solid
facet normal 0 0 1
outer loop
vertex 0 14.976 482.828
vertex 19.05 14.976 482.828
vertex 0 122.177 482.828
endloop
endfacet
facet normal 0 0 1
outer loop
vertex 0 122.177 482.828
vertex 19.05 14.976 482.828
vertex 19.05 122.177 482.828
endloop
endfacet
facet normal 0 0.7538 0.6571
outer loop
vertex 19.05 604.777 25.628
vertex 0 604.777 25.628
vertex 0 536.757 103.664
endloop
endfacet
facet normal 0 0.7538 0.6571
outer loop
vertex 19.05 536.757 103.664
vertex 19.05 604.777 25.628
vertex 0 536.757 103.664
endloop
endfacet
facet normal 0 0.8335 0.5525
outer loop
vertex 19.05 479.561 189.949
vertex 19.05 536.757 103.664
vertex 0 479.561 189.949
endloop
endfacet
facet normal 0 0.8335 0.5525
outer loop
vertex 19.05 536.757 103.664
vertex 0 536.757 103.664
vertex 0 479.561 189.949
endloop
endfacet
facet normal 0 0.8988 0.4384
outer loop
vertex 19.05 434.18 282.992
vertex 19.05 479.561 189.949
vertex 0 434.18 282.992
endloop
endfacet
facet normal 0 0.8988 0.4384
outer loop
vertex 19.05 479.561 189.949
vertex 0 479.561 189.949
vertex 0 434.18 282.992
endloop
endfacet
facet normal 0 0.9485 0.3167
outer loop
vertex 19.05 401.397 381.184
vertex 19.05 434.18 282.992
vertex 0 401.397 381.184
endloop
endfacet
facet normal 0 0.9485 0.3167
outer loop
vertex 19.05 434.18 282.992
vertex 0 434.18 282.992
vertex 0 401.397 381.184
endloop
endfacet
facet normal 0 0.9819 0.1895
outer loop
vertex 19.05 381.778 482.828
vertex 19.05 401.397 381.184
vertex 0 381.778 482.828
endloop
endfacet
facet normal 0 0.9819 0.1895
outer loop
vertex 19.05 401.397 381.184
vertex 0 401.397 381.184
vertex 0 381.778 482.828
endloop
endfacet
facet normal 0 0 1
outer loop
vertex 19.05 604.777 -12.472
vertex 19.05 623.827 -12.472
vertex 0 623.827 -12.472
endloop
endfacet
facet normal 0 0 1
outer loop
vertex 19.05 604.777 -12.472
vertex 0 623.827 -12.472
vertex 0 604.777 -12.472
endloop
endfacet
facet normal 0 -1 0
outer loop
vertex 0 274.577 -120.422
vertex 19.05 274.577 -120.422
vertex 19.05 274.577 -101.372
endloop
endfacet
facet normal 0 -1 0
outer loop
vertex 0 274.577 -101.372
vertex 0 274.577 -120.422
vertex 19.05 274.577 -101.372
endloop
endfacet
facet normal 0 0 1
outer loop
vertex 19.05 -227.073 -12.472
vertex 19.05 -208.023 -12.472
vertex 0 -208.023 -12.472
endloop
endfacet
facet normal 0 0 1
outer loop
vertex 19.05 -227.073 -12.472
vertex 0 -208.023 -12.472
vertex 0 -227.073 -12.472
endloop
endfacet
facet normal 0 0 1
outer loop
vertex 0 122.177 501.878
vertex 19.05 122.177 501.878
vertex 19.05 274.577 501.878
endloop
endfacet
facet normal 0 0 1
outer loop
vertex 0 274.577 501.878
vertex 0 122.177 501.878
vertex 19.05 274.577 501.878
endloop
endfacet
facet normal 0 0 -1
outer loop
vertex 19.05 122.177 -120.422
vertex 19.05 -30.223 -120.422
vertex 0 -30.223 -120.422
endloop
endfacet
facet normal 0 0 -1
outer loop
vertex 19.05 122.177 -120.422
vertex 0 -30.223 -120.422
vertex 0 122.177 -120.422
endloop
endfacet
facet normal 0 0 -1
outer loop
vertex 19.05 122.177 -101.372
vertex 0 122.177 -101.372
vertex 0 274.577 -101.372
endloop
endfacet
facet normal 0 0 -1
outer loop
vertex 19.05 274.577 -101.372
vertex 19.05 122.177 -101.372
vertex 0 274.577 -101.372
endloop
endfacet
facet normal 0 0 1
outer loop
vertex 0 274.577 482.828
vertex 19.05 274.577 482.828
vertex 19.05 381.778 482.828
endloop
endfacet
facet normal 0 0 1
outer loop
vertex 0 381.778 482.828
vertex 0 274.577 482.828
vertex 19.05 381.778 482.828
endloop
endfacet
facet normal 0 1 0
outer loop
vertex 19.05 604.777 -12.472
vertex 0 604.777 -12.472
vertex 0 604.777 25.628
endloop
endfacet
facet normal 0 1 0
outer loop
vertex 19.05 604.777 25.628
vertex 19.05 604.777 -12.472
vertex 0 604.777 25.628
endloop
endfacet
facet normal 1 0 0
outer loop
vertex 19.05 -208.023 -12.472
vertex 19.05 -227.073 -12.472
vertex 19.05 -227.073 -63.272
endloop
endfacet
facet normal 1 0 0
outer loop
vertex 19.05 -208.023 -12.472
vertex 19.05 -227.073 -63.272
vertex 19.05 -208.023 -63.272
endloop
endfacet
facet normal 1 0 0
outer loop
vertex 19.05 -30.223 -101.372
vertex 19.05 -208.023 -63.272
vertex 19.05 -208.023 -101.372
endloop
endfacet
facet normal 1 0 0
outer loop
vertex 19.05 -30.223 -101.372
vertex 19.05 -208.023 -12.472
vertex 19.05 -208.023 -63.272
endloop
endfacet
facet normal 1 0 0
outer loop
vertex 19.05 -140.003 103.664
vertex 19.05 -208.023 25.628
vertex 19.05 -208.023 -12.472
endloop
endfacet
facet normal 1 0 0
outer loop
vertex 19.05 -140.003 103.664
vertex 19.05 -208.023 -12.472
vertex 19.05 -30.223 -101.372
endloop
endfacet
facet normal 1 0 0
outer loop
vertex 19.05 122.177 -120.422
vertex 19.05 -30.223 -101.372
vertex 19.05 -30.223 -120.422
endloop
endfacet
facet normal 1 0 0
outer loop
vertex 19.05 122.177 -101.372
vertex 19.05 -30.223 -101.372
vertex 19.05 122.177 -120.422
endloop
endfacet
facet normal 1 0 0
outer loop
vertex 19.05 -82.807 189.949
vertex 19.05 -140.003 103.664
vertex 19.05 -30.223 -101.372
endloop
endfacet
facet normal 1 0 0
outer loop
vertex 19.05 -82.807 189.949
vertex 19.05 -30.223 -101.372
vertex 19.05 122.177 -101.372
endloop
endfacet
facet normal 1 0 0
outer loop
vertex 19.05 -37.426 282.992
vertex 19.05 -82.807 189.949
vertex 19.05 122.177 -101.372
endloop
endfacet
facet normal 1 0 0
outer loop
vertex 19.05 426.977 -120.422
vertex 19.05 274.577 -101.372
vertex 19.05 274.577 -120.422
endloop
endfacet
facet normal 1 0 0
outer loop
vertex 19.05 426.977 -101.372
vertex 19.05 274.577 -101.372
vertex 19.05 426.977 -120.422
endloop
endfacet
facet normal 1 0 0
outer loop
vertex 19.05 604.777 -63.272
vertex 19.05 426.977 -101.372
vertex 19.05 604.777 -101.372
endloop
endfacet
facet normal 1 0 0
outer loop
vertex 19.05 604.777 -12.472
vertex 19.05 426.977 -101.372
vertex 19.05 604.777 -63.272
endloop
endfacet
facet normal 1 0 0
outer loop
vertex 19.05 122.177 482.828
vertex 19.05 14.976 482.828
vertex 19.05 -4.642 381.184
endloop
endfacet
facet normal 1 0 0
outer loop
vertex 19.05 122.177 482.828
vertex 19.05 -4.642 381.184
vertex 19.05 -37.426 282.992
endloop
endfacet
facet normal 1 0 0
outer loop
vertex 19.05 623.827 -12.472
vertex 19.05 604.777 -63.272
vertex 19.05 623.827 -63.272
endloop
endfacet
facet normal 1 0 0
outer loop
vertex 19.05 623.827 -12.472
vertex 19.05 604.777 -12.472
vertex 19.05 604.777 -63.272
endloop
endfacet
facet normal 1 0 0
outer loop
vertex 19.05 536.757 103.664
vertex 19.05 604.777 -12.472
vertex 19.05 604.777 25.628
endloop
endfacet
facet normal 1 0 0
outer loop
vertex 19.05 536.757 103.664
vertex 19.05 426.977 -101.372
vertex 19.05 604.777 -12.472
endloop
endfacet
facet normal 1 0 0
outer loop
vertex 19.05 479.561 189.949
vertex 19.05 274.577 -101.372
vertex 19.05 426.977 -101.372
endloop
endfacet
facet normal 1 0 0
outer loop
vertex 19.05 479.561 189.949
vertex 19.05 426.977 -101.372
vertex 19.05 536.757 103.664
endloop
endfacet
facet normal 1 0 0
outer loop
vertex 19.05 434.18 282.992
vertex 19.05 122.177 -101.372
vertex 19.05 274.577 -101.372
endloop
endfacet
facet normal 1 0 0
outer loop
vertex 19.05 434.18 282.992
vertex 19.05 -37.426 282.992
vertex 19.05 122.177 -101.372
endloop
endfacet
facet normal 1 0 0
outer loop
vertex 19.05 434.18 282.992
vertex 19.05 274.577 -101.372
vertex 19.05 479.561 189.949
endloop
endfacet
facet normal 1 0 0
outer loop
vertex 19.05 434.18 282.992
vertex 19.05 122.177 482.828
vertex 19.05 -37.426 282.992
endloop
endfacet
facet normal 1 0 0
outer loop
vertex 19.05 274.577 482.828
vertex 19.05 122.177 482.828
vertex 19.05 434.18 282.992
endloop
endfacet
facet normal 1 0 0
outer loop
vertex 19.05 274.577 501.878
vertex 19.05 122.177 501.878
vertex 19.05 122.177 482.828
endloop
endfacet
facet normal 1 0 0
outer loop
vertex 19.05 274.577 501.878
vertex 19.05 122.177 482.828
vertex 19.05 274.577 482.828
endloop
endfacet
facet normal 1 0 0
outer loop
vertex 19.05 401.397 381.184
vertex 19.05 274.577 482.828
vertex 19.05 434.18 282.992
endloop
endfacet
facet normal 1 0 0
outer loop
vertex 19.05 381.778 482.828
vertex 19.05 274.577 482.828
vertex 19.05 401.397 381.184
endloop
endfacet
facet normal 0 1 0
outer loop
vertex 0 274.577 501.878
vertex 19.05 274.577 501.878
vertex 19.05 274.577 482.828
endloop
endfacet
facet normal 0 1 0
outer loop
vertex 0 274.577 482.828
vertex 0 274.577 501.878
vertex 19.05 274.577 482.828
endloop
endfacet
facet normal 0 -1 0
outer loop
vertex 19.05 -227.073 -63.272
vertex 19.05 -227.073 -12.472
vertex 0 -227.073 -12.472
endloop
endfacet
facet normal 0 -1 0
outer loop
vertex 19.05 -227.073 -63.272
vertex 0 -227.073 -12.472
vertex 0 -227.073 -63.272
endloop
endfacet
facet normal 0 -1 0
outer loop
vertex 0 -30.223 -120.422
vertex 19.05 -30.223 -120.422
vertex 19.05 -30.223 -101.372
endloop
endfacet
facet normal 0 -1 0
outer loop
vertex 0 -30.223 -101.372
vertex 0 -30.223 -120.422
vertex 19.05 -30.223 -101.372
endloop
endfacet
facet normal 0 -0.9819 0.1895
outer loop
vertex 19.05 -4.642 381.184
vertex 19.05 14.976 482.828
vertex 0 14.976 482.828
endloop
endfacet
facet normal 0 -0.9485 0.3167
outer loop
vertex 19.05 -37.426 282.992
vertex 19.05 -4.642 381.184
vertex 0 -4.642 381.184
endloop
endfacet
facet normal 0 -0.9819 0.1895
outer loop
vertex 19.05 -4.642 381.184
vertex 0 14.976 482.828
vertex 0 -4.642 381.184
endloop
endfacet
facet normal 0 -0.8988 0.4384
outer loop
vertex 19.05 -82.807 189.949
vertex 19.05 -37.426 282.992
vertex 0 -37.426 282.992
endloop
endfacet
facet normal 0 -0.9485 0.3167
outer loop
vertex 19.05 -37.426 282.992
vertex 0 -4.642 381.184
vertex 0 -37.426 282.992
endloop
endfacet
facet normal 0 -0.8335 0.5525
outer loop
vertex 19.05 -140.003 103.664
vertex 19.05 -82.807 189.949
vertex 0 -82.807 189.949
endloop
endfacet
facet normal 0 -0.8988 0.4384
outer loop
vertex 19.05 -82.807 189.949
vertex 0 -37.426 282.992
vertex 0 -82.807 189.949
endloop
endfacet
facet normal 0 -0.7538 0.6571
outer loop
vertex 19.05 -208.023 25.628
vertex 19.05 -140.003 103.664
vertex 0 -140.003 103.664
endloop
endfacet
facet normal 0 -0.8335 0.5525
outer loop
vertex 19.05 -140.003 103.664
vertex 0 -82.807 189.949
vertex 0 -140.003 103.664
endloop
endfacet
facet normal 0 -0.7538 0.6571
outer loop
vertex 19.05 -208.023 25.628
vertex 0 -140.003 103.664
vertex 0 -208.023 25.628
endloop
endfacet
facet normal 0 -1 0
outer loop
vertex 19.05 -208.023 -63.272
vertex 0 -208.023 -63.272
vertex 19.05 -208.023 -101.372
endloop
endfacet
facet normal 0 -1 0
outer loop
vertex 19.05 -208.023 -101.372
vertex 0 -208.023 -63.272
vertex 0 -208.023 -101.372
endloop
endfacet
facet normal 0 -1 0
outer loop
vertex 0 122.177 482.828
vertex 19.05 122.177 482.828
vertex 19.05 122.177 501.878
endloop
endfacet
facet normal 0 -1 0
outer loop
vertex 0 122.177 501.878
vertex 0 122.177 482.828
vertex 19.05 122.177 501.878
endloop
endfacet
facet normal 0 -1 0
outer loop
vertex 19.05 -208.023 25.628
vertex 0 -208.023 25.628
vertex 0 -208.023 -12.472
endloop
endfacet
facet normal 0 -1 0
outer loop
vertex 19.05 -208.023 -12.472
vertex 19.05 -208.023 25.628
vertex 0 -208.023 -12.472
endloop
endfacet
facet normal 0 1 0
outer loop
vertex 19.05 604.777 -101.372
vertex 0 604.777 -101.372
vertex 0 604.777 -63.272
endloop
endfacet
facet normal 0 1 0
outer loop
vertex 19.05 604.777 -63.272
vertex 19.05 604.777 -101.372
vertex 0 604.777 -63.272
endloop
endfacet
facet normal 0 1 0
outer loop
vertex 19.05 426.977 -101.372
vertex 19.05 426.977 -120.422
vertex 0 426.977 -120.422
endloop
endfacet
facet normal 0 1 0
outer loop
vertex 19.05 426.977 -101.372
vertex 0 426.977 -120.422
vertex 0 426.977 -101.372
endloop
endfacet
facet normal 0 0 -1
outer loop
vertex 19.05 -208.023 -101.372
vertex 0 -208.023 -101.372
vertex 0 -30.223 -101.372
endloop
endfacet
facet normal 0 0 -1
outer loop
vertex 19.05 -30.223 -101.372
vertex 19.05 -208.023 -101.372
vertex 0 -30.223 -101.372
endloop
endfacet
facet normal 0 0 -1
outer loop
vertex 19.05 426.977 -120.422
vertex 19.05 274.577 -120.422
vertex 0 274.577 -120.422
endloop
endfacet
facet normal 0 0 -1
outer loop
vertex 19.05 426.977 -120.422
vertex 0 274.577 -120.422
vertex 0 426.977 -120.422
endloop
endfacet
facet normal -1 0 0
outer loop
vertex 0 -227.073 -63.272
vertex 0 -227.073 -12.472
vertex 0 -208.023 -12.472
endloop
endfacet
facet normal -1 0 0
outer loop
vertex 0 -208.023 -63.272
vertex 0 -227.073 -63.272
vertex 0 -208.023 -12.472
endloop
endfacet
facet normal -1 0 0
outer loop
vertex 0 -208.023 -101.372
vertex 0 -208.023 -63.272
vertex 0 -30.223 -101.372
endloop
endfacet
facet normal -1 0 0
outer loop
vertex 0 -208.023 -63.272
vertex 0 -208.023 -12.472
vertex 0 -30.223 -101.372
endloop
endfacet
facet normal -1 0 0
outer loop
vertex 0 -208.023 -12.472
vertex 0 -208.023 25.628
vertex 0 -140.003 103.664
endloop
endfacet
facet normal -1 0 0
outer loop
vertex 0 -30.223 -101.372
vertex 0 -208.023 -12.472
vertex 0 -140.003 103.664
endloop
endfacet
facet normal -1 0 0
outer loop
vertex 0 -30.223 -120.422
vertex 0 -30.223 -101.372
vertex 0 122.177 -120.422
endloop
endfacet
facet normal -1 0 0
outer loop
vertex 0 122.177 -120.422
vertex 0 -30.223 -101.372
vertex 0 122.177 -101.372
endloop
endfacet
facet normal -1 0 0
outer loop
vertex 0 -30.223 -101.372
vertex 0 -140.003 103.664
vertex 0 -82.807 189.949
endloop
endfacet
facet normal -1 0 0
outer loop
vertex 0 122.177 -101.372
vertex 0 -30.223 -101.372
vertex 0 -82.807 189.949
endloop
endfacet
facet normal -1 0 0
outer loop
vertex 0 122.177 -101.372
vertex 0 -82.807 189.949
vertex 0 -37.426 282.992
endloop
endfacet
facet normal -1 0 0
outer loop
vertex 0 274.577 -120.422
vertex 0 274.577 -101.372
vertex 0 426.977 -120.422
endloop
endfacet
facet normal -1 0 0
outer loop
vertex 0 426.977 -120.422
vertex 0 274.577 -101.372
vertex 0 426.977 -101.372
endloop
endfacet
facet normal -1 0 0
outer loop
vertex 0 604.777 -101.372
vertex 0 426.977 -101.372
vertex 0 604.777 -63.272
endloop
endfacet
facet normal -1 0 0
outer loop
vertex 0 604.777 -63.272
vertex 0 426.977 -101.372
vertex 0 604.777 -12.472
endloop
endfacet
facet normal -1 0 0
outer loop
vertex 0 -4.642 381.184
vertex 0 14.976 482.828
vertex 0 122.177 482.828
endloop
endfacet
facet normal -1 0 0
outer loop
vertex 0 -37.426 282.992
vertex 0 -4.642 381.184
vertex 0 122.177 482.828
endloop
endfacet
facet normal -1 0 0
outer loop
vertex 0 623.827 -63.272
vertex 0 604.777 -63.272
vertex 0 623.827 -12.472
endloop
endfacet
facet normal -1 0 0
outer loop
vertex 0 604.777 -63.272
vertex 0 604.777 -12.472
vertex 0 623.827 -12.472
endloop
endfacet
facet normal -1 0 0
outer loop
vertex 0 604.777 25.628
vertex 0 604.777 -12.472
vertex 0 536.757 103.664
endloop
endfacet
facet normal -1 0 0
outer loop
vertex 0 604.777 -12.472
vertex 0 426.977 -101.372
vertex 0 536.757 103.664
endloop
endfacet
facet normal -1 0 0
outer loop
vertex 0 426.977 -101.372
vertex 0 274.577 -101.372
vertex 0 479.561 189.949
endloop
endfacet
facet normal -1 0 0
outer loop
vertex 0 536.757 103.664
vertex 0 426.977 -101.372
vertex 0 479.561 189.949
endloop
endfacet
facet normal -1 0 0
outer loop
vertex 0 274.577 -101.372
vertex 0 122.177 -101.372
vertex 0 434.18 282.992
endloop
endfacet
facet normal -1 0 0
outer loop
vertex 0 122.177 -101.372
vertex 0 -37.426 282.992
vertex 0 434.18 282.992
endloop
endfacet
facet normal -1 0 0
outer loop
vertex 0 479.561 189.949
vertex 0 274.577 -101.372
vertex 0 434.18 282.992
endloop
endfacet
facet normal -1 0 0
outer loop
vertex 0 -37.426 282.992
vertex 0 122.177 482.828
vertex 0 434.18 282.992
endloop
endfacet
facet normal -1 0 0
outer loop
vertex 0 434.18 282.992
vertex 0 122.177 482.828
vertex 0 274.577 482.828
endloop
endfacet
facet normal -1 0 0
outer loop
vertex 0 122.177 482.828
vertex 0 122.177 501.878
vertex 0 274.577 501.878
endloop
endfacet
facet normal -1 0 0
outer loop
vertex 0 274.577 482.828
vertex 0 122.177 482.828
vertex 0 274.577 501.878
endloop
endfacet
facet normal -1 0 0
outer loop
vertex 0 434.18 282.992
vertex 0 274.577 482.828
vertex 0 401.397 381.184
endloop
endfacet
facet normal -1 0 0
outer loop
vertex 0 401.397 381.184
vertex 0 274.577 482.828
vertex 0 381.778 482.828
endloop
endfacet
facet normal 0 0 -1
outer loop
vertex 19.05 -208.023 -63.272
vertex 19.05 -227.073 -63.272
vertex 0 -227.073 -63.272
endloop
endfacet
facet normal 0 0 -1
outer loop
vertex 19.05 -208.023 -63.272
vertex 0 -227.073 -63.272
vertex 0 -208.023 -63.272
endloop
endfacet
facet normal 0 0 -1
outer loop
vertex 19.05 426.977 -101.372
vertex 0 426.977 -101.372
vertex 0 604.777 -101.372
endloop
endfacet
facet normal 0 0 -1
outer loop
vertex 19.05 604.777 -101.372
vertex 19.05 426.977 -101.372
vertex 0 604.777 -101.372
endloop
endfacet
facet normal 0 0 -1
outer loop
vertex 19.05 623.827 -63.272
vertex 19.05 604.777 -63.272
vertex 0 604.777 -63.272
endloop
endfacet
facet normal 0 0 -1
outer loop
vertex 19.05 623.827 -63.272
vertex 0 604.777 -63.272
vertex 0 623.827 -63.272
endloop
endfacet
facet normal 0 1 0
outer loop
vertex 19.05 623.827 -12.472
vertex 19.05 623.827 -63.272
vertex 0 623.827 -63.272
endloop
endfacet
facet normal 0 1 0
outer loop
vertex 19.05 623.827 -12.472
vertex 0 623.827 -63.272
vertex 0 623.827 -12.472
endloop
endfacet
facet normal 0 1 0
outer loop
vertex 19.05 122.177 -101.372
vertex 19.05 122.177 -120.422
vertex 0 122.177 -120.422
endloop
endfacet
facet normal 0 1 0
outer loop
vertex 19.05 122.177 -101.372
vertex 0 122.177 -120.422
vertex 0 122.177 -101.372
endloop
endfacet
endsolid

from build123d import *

# Parameters (mm, degrees)
F1_DEPTH = 19.05
F2_W     = 152.4
F2_H     = 19.05
F3_DEPTH = 19.05
F4_DEPTH = 19.05
F6_DEPTH = 19.051


with BuildPart() as f1:
    # F0 (on Right) → F1 (new body)
    with BuildSketch(Plane.YZ):
        with BuildLine():
            Line((-208.022948, 25.627738), (-208.022948, -101.372262))
            Line((-208.022948, -101.372262), (604.777052, -101.372262))
            Line((604.777052, -101.372262), (604.777052, 25.627738))
            ThreePointArc((604.777052, 25.627738), (429.785179, 293.978744), (376.177052, 609.827738))
            Line((376.177052, 609.827738), (198.377052, 609.827738))
            Line((198.377052, 609.827738), (20.577052, 609.827738))
            ThreePointArc((20.577052, 609.827738), (-33.031076, 293.978744), (-208.022948, 25.627738))
        make_face()
    extrude(amount=F1_DEPTH)

    # F2 (on face) → F3 (join)
    with BuildSketch(Plane.YZ.offset(19.05)):
        Polygon((274.577052, 628.877738), (198.377052, 628.877738), (122.177052, 628.877738), (122.177052, 609.827738), (274.577052, 609.827738), align=None)
        Polygon((-227.072948, -12.472262), (-227.072948, -37.872262), (-227.072948, -63.272262), (-208.022948, -63.272262), (-208.022948, -12.472262), align=None)
        with Locations((45.977052, -110.897262)):
            Rectangle(F2_W, F2_H)
        with Locations((350.777052, -110.897262)):
            Rectangle(F2_W, F2_H)
        Polygon((623.827052, -63.272262), (623.827052, -37.872262), (623.827052, -12.472262), (604.777052, -12.472262), (604.777052, -63.272262), align=None)
    extrude(amount=-F3_DEPTH)

    # F0 (on Right) → F4 (join)
    with BuildSketch(Plane.YZ):
        with BuildLine():
            Line((-208.022948, 25.627738), (-208.022948, -101.372262))
            Line((-208.022948, -101.372262), (604.777052, -101.372262))
            Line((604.777052, -101.372262), (604.777052, 25.627738))
            ThreePointArc((604.777052, 25.627738), (429.785179, 293.978744), (376.177052, 609.827738))
            Line((376.177052, 609.827738), (198.377052, 609.827738))
            Line((198.377052, 609.827738), (20.577052, 609.827738))
            ThreePointArc((20.577052, 609.827738), (-33.031076, 293.978744), (-208.022948, 25.627738))
        make_face()
    extrude(amount=F4_DEPTH)

    # F5 (on face) → F6 (cut, through all)
    with BuildSketch(Plane.YZ.offset(19.05)):
        with BuildLine():
            ThreePointArc((20.577052, 609.827738), (20.34373, 546.21452), (14.976085, 482.827738))
            Line((14.976085, 482.827738), (122.177052, 482.827738))
            Line((122.177052, 482.827738), (122.177052, 501.877738))
            Line((122.177052, 501.877738), (274.577052, 501.877738))
            Line((274.577052, 501.877738), (274.577052, 482.827738))
            Line((274.577052, 482.827738), (381.778018, 482.827738))
            ThreePointArc((381.778018, 482.827738), (376.410373, 546.21452), (376.177052, 609.827738))
            Line((376.177052, 609.827738), (274.577052, 609.827738))
            Line((274.577052, 609.827738), (274.577052, 628.877738))
            Line((274.577052, 628.877738), (122.177052, 628.877738))
            Line((122.177052, 628.877738), (122.177052, 609.827738))
            Line((122.177052, 609.827738), (20.577052, 609.827738))
        make_face()
    extrude(amount=-F6_DEPTH, mode=Mode.SUBTRACT)


solid = f1.part
